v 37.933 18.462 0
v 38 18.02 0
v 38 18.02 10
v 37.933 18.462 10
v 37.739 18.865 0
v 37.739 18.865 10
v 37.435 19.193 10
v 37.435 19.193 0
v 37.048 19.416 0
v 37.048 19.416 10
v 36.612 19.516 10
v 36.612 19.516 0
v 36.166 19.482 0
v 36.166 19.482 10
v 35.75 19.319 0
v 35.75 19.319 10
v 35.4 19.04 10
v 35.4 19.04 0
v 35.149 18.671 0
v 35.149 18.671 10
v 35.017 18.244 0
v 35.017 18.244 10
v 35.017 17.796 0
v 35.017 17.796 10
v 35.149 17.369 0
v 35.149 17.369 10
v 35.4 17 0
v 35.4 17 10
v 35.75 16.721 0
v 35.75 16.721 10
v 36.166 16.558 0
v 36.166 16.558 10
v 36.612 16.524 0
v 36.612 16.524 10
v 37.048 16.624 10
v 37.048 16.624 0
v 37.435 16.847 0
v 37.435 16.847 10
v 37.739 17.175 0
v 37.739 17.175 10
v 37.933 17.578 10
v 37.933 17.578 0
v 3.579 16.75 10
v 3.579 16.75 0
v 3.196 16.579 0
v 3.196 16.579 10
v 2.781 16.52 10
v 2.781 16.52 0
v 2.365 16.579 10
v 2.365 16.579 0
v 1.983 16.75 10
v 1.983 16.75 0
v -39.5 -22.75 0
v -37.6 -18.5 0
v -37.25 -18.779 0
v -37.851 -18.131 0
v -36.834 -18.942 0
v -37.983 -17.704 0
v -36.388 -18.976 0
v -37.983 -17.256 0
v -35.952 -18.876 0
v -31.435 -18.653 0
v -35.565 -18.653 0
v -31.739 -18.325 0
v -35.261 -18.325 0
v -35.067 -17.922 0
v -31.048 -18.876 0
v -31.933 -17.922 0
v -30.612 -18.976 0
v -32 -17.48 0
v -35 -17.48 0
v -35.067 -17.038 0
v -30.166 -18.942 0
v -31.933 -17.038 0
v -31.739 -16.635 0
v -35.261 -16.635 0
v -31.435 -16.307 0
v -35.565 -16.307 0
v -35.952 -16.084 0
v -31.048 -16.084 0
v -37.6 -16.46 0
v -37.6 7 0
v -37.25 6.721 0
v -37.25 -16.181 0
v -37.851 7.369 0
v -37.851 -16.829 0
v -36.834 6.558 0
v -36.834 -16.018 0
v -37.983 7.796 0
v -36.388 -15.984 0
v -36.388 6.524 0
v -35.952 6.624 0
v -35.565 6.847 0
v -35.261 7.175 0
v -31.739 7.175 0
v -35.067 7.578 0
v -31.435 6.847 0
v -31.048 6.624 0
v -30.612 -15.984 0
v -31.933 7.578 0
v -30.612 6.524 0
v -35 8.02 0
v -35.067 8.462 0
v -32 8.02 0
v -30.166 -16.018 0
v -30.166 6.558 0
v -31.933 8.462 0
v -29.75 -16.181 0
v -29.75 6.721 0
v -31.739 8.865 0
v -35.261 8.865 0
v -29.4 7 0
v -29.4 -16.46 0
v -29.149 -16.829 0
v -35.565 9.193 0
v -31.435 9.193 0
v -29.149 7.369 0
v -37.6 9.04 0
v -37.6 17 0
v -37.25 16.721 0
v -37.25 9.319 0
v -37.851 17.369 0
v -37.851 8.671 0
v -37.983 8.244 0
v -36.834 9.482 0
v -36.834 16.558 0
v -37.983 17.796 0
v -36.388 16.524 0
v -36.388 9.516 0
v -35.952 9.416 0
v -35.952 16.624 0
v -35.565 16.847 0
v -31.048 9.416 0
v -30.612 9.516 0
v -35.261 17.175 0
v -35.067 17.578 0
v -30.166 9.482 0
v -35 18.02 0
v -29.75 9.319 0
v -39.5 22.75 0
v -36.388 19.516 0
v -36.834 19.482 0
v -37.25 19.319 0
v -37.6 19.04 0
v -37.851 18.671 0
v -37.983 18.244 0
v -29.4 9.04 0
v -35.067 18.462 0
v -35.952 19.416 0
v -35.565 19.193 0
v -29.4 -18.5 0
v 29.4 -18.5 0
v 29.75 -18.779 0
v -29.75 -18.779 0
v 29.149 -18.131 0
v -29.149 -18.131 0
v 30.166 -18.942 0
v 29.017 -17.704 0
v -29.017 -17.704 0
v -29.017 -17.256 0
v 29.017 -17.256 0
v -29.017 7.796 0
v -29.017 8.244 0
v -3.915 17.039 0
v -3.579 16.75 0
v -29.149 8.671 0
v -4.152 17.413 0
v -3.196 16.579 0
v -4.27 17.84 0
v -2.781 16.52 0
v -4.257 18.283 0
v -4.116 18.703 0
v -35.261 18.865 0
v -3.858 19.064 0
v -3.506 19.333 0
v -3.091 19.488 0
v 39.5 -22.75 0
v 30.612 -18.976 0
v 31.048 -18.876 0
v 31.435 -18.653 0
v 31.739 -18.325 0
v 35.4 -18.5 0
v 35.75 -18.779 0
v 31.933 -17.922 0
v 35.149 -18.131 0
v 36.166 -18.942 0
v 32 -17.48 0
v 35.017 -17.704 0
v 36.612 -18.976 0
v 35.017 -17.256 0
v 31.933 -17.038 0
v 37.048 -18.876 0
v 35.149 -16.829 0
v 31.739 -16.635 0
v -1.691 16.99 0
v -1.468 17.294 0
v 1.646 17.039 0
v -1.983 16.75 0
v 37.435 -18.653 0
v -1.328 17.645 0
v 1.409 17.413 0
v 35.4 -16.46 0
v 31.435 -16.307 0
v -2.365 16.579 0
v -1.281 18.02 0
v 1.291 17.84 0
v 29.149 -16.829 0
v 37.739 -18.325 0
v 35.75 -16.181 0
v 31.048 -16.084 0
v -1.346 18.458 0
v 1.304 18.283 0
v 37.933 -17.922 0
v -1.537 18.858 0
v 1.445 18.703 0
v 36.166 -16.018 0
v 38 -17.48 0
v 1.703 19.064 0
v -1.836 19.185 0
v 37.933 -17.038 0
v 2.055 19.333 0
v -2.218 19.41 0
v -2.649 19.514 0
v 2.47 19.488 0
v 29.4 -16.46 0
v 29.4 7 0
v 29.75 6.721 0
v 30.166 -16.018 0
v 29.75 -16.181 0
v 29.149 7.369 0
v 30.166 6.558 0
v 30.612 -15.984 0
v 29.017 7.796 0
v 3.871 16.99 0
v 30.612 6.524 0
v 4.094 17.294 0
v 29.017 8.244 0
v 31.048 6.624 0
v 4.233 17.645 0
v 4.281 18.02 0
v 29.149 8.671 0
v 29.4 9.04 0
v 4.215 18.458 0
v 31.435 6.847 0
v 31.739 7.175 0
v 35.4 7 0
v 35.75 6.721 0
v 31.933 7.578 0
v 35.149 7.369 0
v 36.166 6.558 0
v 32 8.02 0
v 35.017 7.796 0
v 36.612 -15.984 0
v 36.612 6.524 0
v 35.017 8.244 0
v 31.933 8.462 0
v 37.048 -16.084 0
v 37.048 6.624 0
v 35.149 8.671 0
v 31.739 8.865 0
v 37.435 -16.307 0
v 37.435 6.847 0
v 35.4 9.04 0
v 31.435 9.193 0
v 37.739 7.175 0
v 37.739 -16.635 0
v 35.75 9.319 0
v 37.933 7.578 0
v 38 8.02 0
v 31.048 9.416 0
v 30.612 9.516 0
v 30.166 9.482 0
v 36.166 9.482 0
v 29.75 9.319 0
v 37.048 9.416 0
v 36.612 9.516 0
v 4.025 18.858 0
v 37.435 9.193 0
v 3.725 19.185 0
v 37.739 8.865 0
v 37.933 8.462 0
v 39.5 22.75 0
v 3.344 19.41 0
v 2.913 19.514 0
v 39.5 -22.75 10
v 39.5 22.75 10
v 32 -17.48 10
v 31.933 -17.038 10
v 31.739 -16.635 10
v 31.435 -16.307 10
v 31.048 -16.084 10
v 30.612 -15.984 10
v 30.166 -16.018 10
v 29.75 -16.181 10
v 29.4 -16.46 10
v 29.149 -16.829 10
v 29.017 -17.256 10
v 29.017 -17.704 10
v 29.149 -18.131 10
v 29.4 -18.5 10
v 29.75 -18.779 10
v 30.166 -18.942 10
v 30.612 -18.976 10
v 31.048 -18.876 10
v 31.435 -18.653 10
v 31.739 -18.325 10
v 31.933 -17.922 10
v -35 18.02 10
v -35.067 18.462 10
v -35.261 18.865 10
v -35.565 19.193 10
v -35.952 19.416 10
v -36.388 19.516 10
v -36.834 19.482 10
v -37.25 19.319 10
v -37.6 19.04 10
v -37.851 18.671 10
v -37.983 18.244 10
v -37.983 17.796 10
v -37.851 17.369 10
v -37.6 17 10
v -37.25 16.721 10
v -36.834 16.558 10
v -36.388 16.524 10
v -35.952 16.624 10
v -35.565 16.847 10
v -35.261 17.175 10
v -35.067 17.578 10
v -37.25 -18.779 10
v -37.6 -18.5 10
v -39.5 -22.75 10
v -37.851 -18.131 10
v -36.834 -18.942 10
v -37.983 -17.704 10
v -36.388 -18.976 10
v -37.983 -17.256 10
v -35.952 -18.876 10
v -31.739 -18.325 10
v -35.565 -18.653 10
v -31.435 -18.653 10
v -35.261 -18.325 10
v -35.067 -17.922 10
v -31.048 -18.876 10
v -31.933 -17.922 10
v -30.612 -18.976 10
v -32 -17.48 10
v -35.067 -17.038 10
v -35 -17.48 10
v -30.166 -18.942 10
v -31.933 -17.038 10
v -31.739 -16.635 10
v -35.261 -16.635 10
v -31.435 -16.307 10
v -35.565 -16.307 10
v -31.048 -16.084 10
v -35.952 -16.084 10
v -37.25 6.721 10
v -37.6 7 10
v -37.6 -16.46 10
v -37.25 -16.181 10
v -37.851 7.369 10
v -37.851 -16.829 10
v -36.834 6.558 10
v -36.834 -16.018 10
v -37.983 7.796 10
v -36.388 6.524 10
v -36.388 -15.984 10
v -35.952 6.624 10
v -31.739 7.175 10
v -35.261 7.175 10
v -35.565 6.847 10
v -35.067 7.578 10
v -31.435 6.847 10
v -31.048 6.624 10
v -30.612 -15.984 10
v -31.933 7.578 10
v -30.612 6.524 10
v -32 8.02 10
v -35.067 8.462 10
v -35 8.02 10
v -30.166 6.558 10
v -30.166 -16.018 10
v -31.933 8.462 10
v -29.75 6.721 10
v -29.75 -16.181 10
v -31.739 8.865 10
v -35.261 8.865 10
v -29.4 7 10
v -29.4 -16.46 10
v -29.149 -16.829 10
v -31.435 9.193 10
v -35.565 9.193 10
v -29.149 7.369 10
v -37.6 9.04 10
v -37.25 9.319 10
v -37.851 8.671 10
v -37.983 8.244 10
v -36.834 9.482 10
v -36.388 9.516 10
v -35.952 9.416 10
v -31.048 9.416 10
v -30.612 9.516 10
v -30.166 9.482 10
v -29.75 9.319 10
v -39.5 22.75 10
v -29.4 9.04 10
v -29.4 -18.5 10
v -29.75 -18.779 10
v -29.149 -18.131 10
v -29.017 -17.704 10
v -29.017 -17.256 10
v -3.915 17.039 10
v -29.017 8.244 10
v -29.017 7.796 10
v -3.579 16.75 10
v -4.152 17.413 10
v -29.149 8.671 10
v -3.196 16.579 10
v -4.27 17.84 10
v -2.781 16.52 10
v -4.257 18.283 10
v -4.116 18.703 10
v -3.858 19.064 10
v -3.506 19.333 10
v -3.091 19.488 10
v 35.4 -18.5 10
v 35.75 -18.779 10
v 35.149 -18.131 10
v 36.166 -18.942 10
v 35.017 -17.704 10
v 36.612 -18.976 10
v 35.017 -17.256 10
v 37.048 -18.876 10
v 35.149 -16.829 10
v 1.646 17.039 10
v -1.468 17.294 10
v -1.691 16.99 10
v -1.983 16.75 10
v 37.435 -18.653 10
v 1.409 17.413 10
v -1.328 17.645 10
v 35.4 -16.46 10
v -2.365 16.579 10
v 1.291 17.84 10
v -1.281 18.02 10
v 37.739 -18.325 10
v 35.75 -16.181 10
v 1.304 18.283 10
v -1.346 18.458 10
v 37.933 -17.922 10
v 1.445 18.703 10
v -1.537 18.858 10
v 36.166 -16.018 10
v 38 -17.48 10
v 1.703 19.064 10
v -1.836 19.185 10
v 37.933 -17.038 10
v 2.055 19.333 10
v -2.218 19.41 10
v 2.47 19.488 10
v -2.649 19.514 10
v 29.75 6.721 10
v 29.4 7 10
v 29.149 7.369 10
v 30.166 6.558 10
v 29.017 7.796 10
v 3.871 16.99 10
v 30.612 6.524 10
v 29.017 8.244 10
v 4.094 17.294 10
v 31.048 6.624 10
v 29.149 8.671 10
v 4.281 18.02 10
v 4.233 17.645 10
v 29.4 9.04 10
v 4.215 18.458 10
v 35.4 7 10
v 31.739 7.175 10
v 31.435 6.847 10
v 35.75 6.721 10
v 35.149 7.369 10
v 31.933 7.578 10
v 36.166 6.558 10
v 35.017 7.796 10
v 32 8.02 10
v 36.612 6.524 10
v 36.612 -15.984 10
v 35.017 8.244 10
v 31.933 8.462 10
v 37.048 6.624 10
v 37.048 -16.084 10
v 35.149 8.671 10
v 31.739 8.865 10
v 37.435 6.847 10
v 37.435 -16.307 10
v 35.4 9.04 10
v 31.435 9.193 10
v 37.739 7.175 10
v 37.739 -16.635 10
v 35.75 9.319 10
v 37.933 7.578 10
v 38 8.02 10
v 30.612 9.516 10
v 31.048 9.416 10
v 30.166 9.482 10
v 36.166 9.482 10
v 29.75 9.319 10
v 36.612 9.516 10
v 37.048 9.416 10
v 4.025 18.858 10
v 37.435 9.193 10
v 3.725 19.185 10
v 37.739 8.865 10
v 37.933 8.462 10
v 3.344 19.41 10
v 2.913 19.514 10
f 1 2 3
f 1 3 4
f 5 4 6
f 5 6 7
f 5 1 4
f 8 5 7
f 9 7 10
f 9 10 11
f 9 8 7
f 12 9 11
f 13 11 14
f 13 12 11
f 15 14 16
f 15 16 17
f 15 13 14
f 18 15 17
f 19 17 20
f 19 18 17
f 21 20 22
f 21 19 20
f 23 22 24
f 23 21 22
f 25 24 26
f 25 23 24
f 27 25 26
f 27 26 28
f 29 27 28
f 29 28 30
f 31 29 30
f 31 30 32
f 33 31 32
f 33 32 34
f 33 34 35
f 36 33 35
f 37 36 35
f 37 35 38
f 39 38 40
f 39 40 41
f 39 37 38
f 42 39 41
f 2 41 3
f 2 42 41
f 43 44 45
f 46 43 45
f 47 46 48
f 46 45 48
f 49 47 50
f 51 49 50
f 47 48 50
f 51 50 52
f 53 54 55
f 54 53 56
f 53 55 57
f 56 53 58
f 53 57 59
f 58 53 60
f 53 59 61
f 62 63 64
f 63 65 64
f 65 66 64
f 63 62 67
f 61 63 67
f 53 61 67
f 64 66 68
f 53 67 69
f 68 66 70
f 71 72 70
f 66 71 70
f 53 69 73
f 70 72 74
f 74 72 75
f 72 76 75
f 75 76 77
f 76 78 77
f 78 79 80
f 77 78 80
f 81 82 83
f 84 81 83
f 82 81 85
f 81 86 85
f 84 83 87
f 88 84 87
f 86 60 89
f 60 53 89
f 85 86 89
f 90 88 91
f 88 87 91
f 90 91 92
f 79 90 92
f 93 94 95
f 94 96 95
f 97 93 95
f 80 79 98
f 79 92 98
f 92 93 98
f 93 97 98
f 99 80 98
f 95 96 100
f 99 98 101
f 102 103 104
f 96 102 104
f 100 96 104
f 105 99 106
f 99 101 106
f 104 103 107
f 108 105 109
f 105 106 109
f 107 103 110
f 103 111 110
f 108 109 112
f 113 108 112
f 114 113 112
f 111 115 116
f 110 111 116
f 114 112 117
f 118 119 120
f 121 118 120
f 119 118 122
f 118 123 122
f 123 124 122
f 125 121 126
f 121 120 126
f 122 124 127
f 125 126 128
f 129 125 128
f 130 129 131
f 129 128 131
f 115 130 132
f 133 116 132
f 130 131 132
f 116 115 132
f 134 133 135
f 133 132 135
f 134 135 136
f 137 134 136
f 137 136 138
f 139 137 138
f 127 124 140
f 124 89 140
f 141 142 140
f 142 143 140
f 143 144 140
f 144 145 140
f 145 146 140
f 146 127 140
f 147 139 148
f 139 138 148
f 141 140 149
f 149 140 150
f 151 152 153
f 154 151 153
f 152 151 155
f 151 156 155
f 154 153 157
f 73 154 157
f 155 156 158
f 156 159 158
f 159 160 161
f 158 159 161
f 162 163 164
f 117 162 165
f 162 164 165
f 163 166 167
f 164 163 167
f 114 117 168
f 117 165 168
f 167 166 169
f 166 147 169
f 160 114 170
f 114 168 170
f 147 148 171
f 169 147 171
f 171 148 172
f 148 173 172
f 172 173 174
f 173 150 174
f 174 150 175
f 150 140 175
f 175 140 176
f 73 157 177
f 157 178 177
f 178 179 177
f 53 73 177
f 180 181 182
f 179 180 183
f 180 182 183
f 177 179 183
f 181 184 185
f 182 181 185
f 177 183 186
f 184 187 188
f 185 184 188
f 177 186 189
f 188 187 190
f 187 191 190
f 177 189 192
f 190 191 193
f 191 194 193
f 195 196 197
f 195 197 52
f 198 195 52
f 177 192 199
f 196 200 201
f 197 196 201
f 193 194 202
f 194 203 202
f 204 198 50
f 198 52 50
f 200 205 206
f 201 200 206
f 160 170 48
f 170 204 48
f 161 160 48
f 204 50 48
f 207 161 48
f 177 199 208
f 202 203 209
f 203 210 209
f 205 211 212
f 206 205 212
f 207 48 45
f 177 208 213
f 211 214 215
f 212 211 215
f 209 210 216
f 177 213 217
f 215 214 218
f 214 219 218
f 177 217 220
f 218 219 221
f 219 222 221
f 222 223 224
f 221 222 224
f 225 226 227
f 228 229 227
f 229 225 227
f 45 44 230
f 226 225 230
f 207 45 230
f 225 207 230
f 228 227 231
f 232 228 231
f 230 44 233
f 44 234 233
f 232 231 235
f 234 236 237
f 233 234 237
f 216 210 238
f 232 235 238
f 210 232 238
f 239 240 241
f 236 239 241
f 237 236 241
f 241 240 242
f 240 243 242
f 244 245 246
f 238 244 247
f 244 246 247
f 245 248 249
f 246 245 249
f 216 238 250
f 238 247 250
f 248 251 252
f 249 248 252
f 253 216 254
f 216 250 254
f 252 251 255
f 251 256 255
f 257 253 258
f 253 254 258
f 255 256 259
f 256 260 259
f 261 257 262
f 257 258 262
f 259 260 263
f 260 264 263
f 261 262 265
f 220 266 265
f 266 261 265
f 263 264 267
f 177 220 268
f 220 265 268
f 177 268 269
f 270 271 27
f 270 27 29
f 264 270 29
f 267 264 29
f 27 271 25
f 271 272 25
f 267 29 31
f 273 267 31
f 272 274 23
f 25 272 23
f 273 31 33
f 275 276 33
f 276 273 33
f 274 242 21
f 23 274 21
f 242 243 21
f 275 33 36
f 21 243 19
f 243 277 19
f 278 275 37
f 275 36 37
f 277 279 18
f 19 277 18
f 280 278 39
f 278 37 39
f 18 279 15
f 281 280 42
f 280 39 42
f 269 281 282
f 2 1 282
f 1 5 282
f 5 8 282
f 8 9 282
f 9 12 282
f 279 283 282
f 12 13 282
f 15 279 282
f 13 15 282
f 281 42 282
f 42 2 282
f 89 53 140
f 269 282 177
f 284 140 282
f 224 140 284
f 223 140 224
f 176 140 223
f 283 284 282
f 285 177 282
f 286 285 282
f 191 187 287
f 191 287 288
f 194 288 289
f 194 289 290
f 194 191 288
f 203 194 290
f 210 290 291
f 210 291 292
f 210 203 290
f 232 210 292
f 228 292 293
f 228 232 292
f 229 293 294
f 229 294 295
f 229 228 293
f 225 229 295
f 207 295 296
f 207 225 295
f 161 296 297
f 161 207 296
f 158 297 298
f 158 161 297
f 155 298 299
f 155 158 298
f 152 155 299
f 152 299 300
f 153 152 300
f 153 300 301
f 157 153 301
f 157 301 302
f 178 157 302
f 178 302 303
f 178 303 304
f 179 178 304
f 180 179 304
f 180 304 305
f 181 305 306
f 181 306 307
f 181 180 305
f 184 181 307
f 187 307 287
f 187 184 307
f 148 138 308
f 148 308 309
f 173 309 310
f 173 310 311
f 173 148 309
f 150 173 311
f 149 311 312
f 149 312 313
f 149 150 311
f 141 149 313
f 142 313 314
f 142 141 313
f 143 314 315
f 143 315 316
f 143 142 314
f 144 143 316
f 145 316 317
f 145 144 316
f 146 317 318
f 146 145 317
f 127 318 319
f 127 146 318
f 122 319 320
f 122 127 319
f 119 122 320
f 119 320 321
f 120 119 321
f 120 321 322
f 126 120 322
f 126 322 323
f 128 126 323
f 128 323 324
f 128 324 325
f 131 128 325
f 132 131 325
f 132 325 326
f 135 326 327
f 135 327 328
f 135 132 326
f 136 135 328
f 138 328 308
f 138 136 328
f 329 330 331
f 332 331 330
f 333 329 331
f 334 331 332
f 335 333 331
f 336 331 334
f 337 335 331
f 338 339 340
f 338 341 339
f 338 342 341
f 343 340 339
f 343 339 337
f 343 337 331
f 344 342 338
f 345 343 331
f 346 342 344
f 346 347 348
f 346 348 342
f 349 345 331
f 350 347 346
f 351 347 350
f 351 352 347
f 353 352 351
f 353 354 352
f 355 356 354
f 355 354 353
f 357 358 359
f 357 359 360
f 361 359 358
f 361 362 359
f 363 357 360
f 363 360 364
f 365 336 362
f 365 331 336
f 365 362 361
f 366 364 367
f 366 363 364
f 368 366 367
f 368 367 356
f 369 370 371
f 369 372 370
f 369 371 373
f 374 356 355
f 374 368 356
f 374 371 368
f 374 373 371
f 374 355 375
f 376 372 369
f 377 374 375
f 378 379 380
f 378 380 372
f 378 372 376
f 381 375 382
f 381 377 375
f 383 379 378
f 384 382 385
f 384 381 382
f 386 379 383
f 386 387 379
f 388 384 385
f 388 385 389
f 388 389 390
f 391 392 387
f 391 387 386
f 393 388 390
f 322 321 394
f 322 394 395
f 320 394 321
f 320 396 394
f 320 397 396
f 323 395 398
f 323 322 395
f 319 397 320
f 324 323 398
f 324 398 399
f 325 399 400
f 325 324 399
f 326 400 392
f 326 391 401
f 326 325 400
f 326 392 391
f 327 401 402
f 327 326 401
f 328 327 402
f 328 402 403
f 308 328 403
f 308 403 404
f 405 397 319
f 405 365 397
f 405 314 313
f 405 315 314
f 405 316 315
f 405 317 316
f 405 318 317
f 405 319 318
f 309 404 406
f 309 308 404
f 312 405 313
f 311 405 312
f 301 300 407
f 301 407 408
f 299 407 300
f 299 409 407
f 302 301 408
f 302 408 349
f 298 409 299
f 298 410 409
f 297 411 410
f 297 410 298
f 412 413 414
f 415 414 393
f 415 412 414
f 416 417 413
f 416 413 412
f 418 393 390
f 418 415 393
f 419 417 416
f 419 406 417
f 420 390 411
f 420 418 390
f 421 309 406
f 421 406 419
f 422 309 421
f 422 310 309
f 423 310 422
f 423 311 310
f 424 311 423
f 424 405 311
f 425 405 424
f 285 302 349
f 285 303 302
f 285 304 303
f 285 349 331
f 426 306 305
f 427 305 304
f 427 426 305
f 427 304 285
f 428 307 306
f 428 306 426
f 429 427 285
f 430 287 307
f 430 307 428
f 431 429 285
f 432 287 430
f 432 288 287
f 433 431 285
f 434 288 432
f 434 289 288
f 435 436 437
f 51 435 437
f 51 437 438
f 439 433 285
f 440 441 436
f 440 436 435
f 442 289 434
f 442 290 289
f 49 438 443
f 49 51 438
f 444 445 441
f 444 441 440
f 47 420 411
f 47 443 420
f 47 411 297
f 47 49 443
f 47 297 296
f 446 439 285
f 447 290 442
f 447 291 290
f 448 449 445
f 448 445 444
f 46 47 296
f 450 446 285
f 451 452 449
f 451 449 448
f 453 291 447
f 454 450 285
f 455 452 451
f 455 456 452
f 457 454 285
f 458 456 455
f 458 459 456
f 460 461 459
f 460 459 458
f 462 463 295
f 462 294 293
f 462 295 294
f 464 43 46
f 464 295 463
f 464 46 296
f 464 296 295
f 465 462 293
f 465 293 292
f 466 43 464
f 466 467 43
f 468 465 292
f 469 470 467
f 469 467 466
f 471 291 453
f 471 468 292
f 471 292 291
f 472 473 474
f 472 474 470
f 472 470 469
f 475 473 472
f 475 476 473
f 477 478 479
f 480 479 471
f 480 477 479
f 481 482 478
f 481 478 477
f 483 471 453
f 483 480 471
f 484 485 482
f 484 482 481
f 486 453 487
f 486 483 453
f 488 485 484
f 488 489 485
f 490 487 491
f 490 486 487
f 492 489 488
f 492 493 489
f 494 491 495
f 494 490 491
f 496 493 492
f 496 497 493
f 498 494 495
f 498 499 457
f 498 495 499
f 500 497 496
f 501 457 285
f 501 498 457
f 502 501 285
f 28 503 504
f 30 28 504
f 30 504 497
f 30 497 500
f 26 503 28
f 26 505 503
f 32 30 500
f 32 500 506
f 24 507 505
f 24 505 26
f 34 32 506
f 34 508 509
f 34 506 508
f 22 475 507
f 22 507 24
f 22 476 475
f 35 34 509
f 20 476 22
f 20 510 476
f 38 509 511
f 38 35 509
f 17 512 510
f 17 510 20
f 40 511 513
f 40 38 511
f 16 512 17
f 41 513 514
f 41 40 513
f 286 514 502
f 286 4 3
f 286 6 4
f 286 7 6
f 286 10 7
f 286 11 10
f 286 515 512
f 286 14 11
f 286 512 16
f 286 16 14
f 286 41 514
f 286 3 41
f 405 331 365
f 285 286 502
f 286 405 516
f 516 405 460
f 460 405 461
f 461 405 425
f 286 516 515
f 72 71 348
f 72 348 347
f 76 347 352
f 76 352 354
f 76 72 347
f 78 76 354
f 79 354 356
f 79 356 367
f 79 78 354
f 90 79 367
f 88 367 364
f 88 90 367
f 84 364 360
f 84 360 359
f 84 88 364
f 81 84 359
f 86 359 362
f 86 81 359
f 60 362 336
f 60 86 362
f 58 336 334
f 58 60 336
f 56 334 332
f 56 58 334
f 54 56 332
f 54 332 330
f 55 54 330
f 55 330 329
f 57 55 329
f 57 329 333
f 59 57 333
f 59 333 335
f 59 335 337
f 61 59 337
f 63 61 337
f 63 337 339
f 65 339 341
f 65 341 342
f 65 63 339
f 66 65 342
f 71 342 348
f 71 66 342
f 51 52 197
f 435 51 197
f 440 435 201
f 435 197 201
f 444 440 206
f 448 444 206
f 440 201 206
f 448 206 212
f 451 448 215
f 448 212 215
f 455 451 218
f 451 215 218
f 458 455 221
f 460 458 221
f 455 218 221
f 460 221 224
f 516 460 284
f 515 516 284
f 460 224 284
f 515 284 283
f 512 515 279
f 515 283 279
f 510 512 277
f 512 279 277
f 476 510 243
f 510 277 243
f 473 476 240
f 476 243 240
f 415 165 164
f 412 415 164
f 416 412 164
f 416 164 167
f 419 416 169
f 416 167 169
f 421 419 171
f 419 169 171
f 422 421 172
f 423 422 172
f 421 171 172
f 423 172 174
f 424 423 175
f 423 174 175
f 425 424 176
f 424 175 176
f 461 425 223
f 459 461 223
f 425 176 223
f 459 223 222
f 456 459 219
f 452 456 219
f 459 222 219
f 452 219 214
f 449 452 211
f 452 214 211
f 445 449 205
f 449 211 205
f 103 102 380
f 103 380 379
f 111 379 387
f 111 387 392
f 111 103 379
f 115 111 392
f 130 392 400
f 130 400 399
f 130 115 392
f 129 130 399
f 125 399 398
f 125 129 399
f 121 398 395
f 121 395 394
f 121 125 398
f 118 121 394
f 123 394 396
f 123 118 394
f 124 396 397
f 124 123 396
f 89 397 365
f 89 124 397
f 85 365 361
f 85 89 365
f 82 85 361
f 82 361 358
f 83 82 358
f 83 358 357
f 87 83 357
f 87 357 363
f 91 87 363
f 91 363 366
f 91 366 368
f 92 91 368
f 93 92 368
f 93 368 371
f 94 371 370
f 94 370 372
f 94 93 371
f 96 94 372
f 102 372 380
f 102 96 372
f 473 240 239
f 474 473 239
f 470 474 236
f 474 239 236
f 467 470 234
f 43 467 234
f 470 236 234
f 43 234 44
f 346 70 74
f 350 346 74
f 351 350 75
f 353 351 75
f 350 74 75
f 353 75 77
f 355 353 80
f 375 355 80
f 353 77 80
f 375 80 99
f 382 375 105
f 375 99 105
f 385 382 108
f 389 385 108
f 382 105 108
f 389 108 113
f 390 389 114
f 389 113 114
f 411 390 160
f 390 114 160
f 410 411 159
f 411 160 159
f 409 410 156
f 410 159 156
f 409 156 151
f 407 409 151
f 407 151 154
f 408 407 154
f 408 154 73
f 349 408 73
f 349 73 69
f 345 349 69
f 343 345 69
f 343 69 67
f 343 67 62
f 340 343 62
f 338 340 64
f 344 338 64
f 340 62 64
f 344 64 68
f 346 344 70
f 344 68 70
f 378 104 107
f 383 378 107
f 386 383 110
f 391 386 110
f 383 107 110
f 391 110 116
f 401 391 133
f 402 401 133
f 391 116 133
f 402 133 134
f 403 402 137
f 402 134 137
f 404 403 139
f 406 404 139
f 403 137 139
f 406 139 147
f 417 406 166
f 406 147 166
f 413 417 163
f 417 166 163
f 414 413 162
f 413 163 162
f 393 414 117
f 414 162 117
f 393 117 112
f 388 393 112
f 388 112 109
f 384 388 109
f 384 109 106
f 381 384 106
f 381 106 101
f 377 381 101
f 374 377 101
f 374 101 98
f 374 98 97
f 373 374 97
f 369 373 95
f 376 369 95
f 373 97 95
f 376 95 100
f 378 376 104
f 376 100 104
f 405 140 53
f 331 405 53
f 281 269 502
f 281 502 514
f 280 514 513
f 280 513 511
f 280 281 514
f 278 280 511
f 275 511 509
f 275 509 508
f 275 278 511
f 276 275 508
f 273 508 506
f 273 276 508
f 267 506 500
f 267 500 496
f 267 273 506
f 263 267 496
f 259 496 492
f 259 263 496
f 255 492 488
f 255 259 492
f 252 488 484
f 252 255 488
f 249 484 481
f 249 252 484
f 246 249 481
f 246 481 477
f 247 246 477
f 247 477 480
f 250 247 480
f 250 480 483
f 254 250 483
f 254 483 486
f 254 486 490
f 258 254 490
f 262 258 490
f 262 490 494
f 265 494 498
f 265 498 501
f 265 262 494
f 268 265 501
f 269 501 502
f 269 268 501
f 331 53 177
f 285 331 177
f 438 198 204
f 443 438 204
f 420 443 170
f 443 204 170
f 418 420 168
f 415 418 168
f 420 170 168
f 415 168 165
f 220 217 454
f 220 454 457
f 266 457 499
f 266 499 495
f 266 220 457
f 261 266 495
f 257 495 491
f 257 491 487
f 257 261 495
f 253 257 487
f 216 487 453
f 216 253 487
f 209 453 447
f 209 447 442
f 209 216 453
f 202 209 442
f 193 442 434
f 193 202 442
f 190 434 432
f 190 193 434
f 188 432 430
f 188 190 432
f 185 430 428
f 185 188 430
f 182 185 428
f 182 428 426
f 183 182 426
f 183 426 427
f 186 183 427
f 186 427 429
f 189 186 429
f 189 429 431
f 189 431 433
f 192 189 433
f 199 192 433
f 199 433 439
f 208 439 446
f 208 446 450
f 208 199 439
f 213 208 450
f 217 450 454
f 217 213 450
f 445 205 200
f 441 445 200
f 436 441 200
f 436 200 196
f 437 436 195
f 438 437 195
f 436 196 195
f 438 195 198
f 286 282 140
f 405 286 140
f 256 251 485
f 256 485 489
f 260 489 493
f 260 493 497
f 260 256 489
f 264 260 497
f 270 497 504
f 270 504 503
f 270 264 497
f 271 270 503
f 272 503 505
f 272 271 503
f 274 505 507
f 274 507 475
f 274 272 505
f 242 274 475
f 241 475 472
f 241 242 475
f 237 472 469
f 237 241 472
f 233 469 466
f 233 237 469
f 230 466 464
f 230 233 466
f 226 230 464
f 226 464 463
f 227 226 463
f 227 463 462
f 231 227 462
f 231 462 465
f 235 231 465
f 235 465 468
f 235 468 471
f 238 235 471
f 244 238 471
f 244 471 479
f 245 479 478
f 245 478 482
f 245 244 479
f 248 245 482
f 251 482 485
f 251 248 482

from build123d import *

# Parameters (mm, degrees)
SKETCH_1_R      = 1.5
EXTRUDE_1_DEPTH = 10


with BuildPart() as part:
    # 草图1 → 凸台-拉伸1 (new body)
    # profile 1 of 7: a face of its own
    with BuildSketch(Plane.XY):
        with BuildLine():
            Line((-33.5, 22.75), (-39.5, 22.75))
            Line((-39.5, 22.75), (-39.5, 9.98))
            Line((-39.5, 9.98), (-39.5, -22.75))
            Line((-39.5, -22.75), (-33.5, -22.75))
            Line((-33.5, -22.75), (39.5, -22.75))
            Line((39.5, -22.75), (39.5, 22.75))
            Line((39.5, 22.75), (6, 22.75))
            Line((6, 22.75), (6, 16.75))
            Line((6, 16.75), (3.578873161, 16.75))
            ThreePointArc((3.578873161, 16.75), (2.780687719, 16.52), (1.982502277, 16.75))
            Line((1.982502277, 16.75), (0, 16.75))
            Line((0, 16.75), (-1.982502277, 16.75))
            ThreePointArc((-1.982502277, 16.75), (-2.780687719, 16.52), (-3.578873161, 16.75))
            Line((-3.578873161, 16.75), (-6, 16.75))
            Line((-6, 16.75), (-6, 22.75))
            Line((-6, 22.75), (-33.5, 22.75))
        make_face()
        with Locations((-36.5, -17.48)):
            Circle(SKETCH_1_R, mode=Mode.SUBTRACT)
        with BuildLine():
            ThreePointArc((-29, -17.48), (-30.5, -18.98), (-32, -17.48))
            ThreePointArc((-32, -17.48), (-30.5, -15.98), (-29, -17.48))
        make_face(mode=Mode.SUBTRACT)
        with Locations((30.5, -17.48)):
            Circle(SKETCH_1_R, mode=Mode.SUBTRACT)
        with Locations((36.5, -17.48)):
            Circle(SKETCH_1_R, mode=Mode.SUBTRACT)
        with Locations((-36.5, 8.02)):
            Circle(SKETCH_1_R, mode=Mode.SUBTRACT)
        with BuildLine():
            ThreePointArc((-29, 8.02), (-30.5, 6.52), (-32, 8.02))
            ThreePointArc((-32, 8.02), (-30.5, 9.52), (-29, 8.02))
        make_face(mode=Mode.SUBTRACT)
        with Locations((-36.5, 18.02)):
            Circle(SKETCH_1_R, mode=Mode.SUBTRACT)
        with Locations((30.5, 8.02)):
            Circle(SKETCH_1_R, mode=Mode.SUBTRACT)
        with Locations((36.5, 8.02)):
            Circle(SKETCH_1_R, mode=Mode.SUBTRACT)
        with Locations((36.5, 18.02)):
            Circle(SKETCH_1_R, mode=Mode.SUBTRACT)
    # profile 2 of 7: a face of its own
    with BuildSketch(Plane.XY):
        with BuildLine():
            Line((-33.5, 22.75), (-39.5, 22.75))
            Line((-39.5, 22.75), (-39.5, 9.98))
            Line((-39.5, 9.98), (-39.5, -22.75))
            Line((-39.5, -22.75), (-33.5, -22.75))
            Line((-33.5, -22.75), (39.5, -22.75))
            Line((39.5, -22.75), (39.5, 22.75))
            Line((39.5, 22.75), (6, 22.75))
            Line((6, 22.75), (6, 16.75))
            Line((6, 16.75), (3.578873161, 16.75))
            ThreePointArc((3.578873161, 16.75), (2.780687719, 16.52), (1.982502277, 16.75))
            Line((1.982502277, 16.75), (0, 16.75))
            Line((0, 16.75), (-1.982502277, 16.75))
            ThreePointArc((-1.982502277, 16.75), (-2.780687719, 16.52), (-3.578873161, 16.75))
            Line((-3.578873161, 16.75), (-6, 16.75))
            Line((-6, 16.75), (-6, 22.75))
            Line((-6, 22.75), (-33.5, 22.75))
        make_face()
        with Locations((-36.5, -17.48)):
            Circle(SKETCH_1_R, mode=Mode.SUBTRACT)
        with BuildLine():
            ThreePointArc((-29, -17.48), (-30.5, -18.98), (-32, -17.48))
            ThreePointArc((-32, -17.48), (-30.5, -15.98), (-29, -17.48))
        make_face(mode=Mode.SUBTRACT)
        with Locations((30.5, -17.48)):
            Circle(SKETCH_1_R, mode=Mode.SUBTRACT)
        with Locations((36.5, -17.48)):
            Circle(SKETCH_1_R, mode=Mode.SUBTRACT)
        with Locations((-36.5, 8.02)):
            Circle(SKETCH_1_R, mode=Mode.SUBTRACT)
        with BuildLine():
            ThreePointArc((-29, 8.02), (-30.5, 6.52), (-32, 8.02))
            ThreePointArc((-32, 8.02), (-30.5, 9.52), (-29, 8.02))
        make_face(mode=Mode.SUBTRACT)
        with Locations((-36.5, 18.02)):
            Circle(SKETCH_1_R, mode=Mode.SUBTRACT)
        with Locations((30.5, 8.02)):
            Circle(SKETCH_1_R, mode=Mode.SUBTRACT)
        with Locations((36.5, 8.02)):
            Circle(SKETCH_1_R, mode=Mode.SUBTRACT)
        with Locations((36.5, 18.02)):
            Circle(SKETCH_1_R, mode=Mode.SUBTRACT)
    # profile 3 of 7: a face of its own
    with BuildSketch(Plane.XY):
        with BuildLine():
            Line((-33.5, 22.75), (-39.5, 22.75))
            Line((-39.5, 22.75), (-39.5, 9.98))
            Line((-39.5, 9.98), (-39.5, -22.75))
            Line((-39.5, -22.75), (-33.5, -22.75))
            Line((-33.5, -22.75), (39.5, -22.75))
            Line((39.5, -22.75), (39.5, 22.75))
            Line((39.5, 22.75), (6, 22.75))
            Line((6, 22.75), (6, 16.75))
            Line((6, 16.75), (3.578873161, 16.75))
            ThreePointArc((3.578873161, 16.75), (2.780687719, 16.52), (1.982502277, 16.75))
            Line((1.982502277, 16.75), (0, 16.75))
            Line((0, 16.75), (-1.982502277, 16.75))
            ThreePointArc((-1.982502277, 16.75), (-2.780687719, 16.52), (-3.578873161, 16.75))
            Line((-3.578873161, 16.75), (-6, 16.75))
            Line((-6, 16.75), (-6, 22.75))
            Line((-6, 22.75), (-33.5, 22.75))
        make_face()
        with Locations((-36.5, -17.48)):
            Circle(SKETCH_1_R, mode=Mode.SUBTRACT)
        with BuildLine():
            ThreePointArc((-29, -17.48), (-30.5, -18.98), (-32, -17.48))
            ThreePointArc((-32, -17.48), (-30.5, -15.98), (-29, -17.48))
        make_face(mode=Mode.SUBTRACT)
        with Locations((30.5, -17.48)):
            Circle(SKETCH_1_R, mode=Mode.SUBTRACT)
        with Locations((36.5, -17.48)):
            Circle(SKETCH_1_R, mode=Mode.SUBTRACT)
        with Locations((-36.5, 8.02)):
            Circle(SKETCH_1_R, mode=Mode.SUBTRACT)
        with BuildLine():
            ThreePointArc((-29, 8.02), (-30.5, 6.52), (-32, 8.02))
            ThreePointArc((-32, 8.02), (-30.5, 9.52), (-29, 8.02))
        make_face(mode=Mode.SUBTRACT)
        with Locations((-36.5, 18.02)):
            Circle(SKETCH_1_R, mode=Mode.SUBTRACT)
        with Locations((30.5, 8.02)):
            Circle(SKETCH_1_R, mode=Mode.SUBTRACT)
        with Locations((36.5, 8.02)):
            Circle(SKETCH_1_R, mode=Mode.SUBTRACT)
        with Locations((36.5, 18.02)):
            Circle(SKETCH_1_R, mode=Mode.SUBTRACT)
    # profile 4 of 7: a face of its own
    with BuildSketch(Plane.XY):
        with BuildLine():
            Line((0, 22.75), (-6, 22.75))
            Line((-6, 22.75), (-6, 16.75))
            Line((-6, 16.75), (-3.578873161, 16.75))
            ThreePointArc((-3.578873161, 16.75), (-3.506195071, 19.332874359), (-1.280687719, 18.02))
            ThreePointArc((-1.280687719, 18.02), (-1.46781336, 17.294492648), (-1.982502277, 16.75))
            Line((-1.982502277, 16.75), (0, 16.75))
            Line((0, 16.75), (0, 22.75))
        make_face()
    # profile 5 of 7: a face of its own
    with BuildSketch(Plane.XY):
        with BuildLine():
            Line((6, 22.75), (0, 22.75))
            Line((0, 22.75), (0, 16.75))
            Line((0, 16.75), (1.982502277, 16.75))
            ThreePointArc((1.982502277, 16.75), (2.055180366, 19.332874359), (4.280687719, 18.02))
            ThreePointArc((4.280687719, 18.02), (4.093562078, 17.294492648), (3.578873161, 16.75))
            Line((3.578873161, 16.75), (6, 16.75))
            Line((6, 16.75), (6, 22.75))
        make_face()
    # profile 6 of 7: a face of its own
    with BuildSketch(Plane.XY):
        with BuildLine():
            Line((-33.5, 22.75), (-39.5, 22.75))
            Line((-39.5, 22.75), (-39.5, 9.98))
            Line((-39.5, 9.98), (-39.5, -22.75))
            Line((-39.5, -22.75), (-33.5, -22.75))
            Line((-33.5, -22.75), (39.5, -22.75))
            Line((39.5, -22.75), (39.5, 22.75))
            Line((39.5, 22.75), (6, 22.75))
            Line((6, 22.75), (6, 16.75))
            Line((6, 16.75), (3.578873161, 16.75))
            ThreePointArc((3.578873161, 16.75), (2.780687719, 16.52), (1.982502277, 16.75))
            Line((1.982502277, 16.75), (0, 16.75))
            Line((0, 16.75), (-1.982502277, 16.75))
            ThreePointArc((-1.982502277, 16.75), (-2.780687719, 16.52), (-3.578873161, 16.75))
            Line((-3.578873161, 16.75), (-6, 16.75))
            Line((-6, 16.75), (-6, 22.75))
            Line((-6, 22.75), (-33.5, 22.75))
        make_face()
        with Locations((-36.5, -17.48)):
            Circle(SKETCH_1_R, mode=Mode.SUBTRACT)
        with BuildLine():
            ThreePointArc((-29, -17.48), (-30.5, -18.98), (-32, -17.48))
            ThreePointArc((-32, -17.48), (-30.5, -15.98), (-29, -17.48))
        make_face(mode=Mode.SUBTRACT)
        with Locations((30.5, -17.48)):
            Circle(SKETCH_1_R, mode=Mode.SUBTRACT)
        with Locations((36.5, -17.48)):
            Circle(SKETCH_1_R, mode=Mode.SUBTRACT)
        with Locations((-36.5, 8.02)):
            Circle(SKETCH_1_R, mode=Mode.SUBTRACT)
        with BuildLine():
            ThreePointArc((-29, 8.02), (-30.5, 6.52), (-32, 8.02))
            ThreePointArc((-32, 8.02), (-30.5, 9.52), (-29, 8.02))
        make_face(mode=Mode.SUBTRACT)
        with Locations((-36.5, 18.02)):
            Circle(SKETCH_1_R, mode=Mode.SUBTRACT)
        with Locations((30.5, 8.02)):
            Circle(SKETCH_1_R, mode=Mode.SUBTRACT)
        with Locations((36.5, 8.02)):
            Circle(SKETCH_1_R, mode=Mode.SUBTRACT)
        with Locations((36.5, 18.02)):
            Circle(SKETCH_1_R, mode=Mode.SUBTRACT)
    # profile 7 of 7: a face of its own
    with BuildSketch(Plane.XY):
        with BuildLine():
            Line((-33.5, 22.75), (-39.5, 22.75))
            Line((-39.5, 22.75), (-39.5, 9.98))
            Line((-39.5, 9.98), (-39.5, -22.75))
            Line((-39.5, -22.75), (-33.5, -22.75))
            Line((-33.5, -22.75), (39.5, -22.75))
            Line((39.5, -22.75), (39.5, 22.75))
            Line((39.5, 22.75), (6, 22.75))
            Line((6, 22.75), (6, 16.75))
            Line((6, 16.75), (3.578873161, 16.75))
            ThreePointArc((3.578873161, 16.75), (2.780687719, 16.52), (1.982502277, 16.75))
            Line((1.982502277, 16.75), (0, 16.75))
            Line((0, 16.75), (-1.982502277, 16.75))
            ThreePointArc((-1.982502277, 16.75), (-2.780687719, 16.52), (-3.578873161, 16.75))
            Line((-3.578873161, 16.75), (-6, 16.75))
            Line((-6, 16.75), (-6, 22.75))
            Line((-6, 22.75), (-33.5, 22.75))
        make_face()
        with Locations((-36.5, -17.48)):
            Circle(SKETCH_1_R, mode=Mode.SUBTRACT)
        with BuildLine():
            ThreePointArc((-29, -17.48), (-30.5, -18.98), (-32, -17.48))
            ThreePointArc((-32, -17.48), (-30.5, -15.98), (-29, -17.48))
        make_face(mode=Mode.SUBTRACT)
        with Locations((30.5, -17.48)):
            Circle(SKETCH_1_R, mode=Mode.SUBTRACT)
        with Locations((36.5, -17.48)):
            Circle(SKETCH_1_R, mode=Mode.SUBTRACT)
        with Locations((-36.5, 8.02)):
            Circle(SKETCH_1_R, mode=Mode.SUBTRACT)
        with BuildLine():
            ThreePointArc((-29, 8.02), (-30.5, 6.52), (-32, 8.02))
            ThreePointArc((-32, 8.02), (-30.5, 9.52), (-29, 8.02))
        make_face(mode=Mode.SUBTRACT)
        with Locations((-36.5, 18.02)):
            Circle(SKETCH_1_R, mode=Mode.SUBTRACT)
        with Locations((30.5, 8.02)):
            Circle(SKETCH_1_R, mode=Mode.SUBTRACT)
        with Locations((36.5, 8.02)):
            Circle(SKETCH_1_R, mode=Mode.SUBTRACT)
        with Locations((36.5, 18.02)):
            Circle(SKETCH_1_R, mode=Mode.SUBTRACT)
    extrude(amount=EXTRUDE_1_DEPTH)


solid = part.part
